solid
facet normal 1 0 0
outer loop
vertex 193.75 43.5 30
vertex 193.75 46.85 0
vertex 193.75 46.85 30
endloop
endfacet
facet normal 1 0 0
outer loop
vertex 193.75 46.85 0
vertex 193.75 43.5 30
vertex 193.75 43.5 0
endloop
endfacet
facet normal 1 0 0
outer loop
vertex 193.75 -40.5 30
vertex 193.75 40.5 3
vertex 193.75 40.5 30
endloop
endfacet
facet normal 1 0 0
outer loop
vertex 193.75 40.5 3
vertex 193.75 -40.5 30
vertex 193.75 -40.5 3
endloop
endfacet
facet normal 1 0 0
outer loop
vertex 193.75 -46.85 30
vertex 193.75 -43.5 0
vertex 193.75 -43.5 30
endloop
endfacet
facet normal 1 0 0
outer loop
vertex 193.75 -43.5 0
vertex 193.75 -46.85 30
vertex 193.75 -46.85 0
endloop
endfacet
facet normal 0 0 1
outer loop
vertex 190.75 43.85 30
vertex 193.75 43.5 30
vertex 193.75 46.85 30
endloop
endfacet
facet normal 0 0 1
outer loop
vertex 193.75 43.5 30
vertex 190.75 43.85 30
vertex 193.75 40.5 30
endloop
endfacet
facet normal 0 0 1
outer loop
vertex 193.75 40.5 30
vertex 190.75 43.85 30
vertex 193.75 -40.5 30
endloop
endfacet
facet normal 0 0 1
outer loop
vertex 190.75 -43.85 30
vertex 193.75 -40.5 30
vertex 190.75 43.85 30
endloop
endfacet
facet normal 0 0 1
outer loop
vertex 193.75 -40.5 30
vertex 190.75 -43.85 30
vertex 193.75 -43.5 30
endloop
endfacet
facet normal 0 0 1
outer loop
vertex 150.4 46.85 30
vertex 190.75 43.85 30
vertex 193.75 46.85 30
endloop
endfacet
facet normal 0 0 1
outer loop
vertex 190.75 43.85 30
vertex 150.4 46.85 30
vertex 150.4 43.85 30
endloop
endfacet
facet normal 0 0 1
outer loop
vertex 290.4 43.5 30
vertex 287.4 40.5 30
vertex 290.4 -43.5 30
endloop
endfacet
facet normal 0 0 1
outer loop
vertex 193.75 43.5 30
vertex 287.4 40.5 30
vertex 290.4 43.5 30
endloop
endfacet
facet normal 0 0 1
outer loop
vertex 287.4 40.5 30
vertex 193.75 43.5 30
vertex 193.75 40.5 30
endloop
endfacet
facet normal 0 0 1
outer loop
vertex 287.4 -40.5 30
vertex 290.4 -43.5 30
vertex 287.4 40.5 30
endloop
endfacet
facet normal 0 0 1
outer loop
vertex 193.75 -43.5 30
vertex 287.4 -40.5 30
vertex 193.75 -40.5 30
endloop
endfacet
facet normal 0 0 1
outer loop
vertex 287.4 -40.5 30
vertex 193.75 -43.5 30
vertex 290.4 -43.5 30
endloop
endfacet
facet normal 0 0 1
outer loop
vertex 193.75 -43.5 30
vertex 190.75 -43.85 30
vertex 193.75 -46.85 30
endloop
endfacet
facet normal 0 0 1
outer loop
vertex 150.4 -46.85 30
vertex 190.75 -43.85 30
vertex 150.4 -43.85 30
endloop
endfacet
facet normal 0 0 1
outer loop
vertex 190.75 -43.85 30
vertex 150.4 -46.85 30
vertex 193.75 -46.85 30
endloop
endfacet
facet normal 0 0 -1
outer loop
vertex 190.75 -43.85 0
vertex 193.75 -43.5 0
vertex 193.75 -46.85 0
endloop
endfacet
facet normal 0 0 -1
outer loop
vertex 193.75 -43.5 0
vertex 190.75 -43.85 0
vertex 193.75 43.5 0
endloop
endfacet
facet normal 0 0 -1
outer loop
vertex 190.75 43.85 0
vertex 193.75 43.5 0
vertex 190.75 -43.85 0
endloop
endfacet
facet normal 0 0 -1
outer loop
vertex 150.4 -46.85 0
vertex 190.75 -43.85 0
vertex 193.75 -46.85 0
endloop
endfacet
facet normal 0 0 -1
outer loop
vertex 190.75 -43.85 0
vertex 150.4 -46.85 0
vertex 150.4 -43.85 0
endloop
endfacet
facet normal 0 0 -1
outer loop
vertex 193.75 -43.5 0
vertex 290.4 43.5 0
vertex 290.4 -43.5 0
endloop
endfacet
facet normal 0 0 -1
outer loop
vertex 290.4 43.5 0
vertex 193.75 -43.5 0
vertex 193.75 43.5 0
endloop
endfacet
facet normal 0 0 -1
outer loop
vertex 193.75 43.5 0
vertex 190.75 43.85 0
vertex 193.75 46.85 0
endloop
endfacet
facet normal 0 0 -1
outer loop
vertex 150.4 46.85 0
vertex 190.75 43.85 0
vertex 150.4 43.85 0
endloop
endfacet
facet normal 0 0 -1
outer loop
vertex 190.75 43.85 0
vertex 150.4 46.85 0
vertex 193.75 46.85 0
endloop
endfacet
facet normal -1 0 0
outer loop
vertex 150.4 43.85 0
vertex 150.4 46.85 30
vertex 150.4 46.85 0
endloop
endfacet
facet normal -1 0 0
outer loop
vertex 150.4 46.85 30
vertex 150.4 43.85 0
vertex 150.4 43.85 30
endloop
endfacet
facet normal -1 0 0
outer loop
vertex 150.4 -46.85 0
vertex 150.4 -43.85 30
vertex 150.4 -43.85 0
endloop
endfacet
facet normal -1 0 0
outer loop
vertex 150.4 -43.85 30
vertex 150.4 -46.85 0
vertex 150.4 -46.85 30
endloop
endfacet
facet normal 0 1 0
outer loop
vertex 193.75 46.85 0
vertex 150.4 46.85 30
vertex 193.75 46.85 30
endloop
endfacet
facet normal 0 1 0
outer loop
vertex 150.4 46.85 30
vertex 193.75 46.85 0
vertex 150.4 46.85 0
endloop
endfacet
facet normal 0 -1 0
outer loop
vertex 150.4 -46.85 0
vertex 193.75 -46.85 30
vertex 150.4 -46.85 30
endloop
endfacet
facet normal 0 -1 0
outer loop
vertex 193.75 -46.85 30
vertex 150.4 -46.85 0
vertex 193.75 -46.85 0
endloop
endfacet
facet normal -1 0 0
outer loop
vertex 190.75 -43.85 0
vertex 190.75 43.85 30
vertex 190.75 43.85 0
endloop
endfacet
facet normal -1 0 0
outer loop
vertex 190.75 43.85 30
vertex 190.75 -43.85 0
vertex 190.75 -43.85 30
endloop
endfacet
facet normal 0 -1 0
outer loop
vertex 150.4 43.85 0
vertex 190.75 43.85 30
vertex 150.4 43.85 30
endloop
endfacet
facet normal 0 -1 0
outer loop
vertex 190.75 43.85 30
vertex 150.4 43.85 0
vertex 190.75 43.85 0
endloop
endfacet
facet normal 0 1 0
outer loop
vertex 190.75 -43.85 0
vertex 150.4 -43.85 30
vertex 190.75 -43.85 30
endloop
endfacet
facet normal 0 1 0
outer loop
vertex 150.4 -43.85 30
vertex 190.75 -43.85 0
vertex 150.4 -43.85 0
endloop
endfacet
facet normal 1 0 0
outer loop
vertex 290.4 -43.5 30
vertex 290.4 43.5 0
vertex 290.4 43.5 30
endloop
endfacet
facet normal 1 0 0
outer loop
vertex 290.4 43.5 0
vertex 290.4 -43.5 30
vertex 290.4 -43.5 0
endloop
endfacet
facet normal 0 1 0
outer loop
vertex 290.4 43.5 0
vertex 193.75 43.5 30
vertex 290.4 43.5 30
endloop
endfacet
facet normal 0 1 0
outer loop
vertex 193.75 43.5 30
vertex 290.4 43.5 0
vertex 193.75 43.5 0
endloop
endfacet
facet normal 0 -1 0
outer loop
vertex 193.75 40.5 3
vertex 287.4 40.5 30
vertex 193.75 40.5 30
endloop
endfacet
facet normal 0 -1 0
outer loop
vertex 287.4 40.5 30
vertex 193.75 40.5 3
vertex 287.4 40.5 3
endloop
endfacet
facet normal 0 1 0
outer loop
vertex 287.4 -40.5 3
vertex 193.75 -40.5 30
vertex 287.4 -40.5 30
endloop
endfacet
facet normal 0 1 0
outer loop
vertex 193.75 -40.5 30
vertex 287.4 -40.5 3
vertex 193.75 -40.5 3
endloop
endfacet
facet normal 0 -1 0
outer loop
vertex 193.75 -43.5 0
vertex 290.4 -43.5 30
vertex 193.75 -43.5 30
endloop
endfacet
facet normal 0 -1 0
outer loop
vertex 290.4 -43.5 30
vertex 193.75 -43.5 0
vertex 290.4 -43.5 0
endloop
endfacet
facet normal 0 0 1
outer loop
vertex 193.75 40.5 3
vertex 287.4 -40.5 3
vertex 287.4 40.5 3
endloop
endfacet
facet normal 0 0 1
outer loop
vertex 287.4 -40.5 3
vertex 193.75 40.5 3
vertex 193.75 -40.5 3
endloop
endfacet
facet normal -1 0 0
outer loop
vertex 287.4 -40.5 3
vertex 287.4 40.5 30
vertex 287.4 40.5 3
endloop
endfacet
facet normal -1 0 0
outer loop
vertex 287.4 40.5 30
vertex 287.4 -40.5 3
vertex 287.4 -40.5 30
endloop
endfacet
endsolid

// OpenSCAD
// Scanning Rig - Optional setback spacer (moves the scan boost further back)
// Render this file to generate scan_setback.stl
//
// Authored about the platter axis, in assembled position straddling the rig
// link's dock, so CI's mating-pair interference check compares it against
// rig_link.stl where it actually sits. The viewers call geometry.center(), so
// the off-centre origin is invisible there.

include <_scanning_rig.scad>

scan_setback();
